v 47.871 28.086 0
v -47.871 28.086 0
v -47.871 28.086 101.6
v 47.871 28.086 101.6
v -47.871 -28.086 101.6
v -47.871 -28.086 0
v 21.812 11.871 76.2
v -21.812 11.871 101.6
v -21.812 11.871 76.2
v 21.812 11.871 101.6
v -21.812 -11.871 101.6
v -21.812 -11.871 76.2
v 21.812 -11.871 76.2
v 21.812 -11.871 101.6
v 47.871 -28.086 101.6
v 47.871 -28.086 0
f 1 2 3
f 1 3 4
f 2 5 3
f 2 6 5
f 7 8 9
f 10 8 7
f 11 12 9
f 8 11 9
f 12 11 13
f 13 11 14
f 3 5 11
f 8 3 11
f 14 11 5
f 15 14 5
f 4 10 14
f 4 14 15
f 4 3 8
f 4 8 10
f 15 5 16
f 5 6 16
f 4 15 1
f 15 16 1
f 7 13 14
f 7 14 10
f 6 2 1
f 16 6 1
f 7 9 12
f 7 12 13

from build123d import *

# Parameters (mm, degrees)
F0_W      = 95.741764
F0_H      = 56.171074
F1_DEPTH  = 76.2
F1_FACE_W = 95.741764
F1_FACE_H = 56.171074
F2_DEPTH  = 25.4
F3_W      = 43.624266
F3_H      = 23.742414
F4_DEPTH  = 25.4


with BuildPart() as f1:
    # F0 (on Top) → F1 (new body)
    with BuildSketch(Plane.XY):
        Rectangle(F0_W, F0_H)
    extrude(amount=F1_DEPTH)

    # F1_face (on face) → F2 (join)
    with BuildSketch(Plane.XY.offset(76.2)):
        Rectangle(F1_FACE_W, F1_FACE_H)
    extrude(amount=F2_DEPTH)

    # F3 (on face) → F4 (cut)
    with BuildSketch(Plane.XY.offset(101.6)):
        Rectangle(F3_W, F3_H)
    extrude(amount=-F4_DEPTH, mode=Mode.SUBTRACT)


solid = f1.part
